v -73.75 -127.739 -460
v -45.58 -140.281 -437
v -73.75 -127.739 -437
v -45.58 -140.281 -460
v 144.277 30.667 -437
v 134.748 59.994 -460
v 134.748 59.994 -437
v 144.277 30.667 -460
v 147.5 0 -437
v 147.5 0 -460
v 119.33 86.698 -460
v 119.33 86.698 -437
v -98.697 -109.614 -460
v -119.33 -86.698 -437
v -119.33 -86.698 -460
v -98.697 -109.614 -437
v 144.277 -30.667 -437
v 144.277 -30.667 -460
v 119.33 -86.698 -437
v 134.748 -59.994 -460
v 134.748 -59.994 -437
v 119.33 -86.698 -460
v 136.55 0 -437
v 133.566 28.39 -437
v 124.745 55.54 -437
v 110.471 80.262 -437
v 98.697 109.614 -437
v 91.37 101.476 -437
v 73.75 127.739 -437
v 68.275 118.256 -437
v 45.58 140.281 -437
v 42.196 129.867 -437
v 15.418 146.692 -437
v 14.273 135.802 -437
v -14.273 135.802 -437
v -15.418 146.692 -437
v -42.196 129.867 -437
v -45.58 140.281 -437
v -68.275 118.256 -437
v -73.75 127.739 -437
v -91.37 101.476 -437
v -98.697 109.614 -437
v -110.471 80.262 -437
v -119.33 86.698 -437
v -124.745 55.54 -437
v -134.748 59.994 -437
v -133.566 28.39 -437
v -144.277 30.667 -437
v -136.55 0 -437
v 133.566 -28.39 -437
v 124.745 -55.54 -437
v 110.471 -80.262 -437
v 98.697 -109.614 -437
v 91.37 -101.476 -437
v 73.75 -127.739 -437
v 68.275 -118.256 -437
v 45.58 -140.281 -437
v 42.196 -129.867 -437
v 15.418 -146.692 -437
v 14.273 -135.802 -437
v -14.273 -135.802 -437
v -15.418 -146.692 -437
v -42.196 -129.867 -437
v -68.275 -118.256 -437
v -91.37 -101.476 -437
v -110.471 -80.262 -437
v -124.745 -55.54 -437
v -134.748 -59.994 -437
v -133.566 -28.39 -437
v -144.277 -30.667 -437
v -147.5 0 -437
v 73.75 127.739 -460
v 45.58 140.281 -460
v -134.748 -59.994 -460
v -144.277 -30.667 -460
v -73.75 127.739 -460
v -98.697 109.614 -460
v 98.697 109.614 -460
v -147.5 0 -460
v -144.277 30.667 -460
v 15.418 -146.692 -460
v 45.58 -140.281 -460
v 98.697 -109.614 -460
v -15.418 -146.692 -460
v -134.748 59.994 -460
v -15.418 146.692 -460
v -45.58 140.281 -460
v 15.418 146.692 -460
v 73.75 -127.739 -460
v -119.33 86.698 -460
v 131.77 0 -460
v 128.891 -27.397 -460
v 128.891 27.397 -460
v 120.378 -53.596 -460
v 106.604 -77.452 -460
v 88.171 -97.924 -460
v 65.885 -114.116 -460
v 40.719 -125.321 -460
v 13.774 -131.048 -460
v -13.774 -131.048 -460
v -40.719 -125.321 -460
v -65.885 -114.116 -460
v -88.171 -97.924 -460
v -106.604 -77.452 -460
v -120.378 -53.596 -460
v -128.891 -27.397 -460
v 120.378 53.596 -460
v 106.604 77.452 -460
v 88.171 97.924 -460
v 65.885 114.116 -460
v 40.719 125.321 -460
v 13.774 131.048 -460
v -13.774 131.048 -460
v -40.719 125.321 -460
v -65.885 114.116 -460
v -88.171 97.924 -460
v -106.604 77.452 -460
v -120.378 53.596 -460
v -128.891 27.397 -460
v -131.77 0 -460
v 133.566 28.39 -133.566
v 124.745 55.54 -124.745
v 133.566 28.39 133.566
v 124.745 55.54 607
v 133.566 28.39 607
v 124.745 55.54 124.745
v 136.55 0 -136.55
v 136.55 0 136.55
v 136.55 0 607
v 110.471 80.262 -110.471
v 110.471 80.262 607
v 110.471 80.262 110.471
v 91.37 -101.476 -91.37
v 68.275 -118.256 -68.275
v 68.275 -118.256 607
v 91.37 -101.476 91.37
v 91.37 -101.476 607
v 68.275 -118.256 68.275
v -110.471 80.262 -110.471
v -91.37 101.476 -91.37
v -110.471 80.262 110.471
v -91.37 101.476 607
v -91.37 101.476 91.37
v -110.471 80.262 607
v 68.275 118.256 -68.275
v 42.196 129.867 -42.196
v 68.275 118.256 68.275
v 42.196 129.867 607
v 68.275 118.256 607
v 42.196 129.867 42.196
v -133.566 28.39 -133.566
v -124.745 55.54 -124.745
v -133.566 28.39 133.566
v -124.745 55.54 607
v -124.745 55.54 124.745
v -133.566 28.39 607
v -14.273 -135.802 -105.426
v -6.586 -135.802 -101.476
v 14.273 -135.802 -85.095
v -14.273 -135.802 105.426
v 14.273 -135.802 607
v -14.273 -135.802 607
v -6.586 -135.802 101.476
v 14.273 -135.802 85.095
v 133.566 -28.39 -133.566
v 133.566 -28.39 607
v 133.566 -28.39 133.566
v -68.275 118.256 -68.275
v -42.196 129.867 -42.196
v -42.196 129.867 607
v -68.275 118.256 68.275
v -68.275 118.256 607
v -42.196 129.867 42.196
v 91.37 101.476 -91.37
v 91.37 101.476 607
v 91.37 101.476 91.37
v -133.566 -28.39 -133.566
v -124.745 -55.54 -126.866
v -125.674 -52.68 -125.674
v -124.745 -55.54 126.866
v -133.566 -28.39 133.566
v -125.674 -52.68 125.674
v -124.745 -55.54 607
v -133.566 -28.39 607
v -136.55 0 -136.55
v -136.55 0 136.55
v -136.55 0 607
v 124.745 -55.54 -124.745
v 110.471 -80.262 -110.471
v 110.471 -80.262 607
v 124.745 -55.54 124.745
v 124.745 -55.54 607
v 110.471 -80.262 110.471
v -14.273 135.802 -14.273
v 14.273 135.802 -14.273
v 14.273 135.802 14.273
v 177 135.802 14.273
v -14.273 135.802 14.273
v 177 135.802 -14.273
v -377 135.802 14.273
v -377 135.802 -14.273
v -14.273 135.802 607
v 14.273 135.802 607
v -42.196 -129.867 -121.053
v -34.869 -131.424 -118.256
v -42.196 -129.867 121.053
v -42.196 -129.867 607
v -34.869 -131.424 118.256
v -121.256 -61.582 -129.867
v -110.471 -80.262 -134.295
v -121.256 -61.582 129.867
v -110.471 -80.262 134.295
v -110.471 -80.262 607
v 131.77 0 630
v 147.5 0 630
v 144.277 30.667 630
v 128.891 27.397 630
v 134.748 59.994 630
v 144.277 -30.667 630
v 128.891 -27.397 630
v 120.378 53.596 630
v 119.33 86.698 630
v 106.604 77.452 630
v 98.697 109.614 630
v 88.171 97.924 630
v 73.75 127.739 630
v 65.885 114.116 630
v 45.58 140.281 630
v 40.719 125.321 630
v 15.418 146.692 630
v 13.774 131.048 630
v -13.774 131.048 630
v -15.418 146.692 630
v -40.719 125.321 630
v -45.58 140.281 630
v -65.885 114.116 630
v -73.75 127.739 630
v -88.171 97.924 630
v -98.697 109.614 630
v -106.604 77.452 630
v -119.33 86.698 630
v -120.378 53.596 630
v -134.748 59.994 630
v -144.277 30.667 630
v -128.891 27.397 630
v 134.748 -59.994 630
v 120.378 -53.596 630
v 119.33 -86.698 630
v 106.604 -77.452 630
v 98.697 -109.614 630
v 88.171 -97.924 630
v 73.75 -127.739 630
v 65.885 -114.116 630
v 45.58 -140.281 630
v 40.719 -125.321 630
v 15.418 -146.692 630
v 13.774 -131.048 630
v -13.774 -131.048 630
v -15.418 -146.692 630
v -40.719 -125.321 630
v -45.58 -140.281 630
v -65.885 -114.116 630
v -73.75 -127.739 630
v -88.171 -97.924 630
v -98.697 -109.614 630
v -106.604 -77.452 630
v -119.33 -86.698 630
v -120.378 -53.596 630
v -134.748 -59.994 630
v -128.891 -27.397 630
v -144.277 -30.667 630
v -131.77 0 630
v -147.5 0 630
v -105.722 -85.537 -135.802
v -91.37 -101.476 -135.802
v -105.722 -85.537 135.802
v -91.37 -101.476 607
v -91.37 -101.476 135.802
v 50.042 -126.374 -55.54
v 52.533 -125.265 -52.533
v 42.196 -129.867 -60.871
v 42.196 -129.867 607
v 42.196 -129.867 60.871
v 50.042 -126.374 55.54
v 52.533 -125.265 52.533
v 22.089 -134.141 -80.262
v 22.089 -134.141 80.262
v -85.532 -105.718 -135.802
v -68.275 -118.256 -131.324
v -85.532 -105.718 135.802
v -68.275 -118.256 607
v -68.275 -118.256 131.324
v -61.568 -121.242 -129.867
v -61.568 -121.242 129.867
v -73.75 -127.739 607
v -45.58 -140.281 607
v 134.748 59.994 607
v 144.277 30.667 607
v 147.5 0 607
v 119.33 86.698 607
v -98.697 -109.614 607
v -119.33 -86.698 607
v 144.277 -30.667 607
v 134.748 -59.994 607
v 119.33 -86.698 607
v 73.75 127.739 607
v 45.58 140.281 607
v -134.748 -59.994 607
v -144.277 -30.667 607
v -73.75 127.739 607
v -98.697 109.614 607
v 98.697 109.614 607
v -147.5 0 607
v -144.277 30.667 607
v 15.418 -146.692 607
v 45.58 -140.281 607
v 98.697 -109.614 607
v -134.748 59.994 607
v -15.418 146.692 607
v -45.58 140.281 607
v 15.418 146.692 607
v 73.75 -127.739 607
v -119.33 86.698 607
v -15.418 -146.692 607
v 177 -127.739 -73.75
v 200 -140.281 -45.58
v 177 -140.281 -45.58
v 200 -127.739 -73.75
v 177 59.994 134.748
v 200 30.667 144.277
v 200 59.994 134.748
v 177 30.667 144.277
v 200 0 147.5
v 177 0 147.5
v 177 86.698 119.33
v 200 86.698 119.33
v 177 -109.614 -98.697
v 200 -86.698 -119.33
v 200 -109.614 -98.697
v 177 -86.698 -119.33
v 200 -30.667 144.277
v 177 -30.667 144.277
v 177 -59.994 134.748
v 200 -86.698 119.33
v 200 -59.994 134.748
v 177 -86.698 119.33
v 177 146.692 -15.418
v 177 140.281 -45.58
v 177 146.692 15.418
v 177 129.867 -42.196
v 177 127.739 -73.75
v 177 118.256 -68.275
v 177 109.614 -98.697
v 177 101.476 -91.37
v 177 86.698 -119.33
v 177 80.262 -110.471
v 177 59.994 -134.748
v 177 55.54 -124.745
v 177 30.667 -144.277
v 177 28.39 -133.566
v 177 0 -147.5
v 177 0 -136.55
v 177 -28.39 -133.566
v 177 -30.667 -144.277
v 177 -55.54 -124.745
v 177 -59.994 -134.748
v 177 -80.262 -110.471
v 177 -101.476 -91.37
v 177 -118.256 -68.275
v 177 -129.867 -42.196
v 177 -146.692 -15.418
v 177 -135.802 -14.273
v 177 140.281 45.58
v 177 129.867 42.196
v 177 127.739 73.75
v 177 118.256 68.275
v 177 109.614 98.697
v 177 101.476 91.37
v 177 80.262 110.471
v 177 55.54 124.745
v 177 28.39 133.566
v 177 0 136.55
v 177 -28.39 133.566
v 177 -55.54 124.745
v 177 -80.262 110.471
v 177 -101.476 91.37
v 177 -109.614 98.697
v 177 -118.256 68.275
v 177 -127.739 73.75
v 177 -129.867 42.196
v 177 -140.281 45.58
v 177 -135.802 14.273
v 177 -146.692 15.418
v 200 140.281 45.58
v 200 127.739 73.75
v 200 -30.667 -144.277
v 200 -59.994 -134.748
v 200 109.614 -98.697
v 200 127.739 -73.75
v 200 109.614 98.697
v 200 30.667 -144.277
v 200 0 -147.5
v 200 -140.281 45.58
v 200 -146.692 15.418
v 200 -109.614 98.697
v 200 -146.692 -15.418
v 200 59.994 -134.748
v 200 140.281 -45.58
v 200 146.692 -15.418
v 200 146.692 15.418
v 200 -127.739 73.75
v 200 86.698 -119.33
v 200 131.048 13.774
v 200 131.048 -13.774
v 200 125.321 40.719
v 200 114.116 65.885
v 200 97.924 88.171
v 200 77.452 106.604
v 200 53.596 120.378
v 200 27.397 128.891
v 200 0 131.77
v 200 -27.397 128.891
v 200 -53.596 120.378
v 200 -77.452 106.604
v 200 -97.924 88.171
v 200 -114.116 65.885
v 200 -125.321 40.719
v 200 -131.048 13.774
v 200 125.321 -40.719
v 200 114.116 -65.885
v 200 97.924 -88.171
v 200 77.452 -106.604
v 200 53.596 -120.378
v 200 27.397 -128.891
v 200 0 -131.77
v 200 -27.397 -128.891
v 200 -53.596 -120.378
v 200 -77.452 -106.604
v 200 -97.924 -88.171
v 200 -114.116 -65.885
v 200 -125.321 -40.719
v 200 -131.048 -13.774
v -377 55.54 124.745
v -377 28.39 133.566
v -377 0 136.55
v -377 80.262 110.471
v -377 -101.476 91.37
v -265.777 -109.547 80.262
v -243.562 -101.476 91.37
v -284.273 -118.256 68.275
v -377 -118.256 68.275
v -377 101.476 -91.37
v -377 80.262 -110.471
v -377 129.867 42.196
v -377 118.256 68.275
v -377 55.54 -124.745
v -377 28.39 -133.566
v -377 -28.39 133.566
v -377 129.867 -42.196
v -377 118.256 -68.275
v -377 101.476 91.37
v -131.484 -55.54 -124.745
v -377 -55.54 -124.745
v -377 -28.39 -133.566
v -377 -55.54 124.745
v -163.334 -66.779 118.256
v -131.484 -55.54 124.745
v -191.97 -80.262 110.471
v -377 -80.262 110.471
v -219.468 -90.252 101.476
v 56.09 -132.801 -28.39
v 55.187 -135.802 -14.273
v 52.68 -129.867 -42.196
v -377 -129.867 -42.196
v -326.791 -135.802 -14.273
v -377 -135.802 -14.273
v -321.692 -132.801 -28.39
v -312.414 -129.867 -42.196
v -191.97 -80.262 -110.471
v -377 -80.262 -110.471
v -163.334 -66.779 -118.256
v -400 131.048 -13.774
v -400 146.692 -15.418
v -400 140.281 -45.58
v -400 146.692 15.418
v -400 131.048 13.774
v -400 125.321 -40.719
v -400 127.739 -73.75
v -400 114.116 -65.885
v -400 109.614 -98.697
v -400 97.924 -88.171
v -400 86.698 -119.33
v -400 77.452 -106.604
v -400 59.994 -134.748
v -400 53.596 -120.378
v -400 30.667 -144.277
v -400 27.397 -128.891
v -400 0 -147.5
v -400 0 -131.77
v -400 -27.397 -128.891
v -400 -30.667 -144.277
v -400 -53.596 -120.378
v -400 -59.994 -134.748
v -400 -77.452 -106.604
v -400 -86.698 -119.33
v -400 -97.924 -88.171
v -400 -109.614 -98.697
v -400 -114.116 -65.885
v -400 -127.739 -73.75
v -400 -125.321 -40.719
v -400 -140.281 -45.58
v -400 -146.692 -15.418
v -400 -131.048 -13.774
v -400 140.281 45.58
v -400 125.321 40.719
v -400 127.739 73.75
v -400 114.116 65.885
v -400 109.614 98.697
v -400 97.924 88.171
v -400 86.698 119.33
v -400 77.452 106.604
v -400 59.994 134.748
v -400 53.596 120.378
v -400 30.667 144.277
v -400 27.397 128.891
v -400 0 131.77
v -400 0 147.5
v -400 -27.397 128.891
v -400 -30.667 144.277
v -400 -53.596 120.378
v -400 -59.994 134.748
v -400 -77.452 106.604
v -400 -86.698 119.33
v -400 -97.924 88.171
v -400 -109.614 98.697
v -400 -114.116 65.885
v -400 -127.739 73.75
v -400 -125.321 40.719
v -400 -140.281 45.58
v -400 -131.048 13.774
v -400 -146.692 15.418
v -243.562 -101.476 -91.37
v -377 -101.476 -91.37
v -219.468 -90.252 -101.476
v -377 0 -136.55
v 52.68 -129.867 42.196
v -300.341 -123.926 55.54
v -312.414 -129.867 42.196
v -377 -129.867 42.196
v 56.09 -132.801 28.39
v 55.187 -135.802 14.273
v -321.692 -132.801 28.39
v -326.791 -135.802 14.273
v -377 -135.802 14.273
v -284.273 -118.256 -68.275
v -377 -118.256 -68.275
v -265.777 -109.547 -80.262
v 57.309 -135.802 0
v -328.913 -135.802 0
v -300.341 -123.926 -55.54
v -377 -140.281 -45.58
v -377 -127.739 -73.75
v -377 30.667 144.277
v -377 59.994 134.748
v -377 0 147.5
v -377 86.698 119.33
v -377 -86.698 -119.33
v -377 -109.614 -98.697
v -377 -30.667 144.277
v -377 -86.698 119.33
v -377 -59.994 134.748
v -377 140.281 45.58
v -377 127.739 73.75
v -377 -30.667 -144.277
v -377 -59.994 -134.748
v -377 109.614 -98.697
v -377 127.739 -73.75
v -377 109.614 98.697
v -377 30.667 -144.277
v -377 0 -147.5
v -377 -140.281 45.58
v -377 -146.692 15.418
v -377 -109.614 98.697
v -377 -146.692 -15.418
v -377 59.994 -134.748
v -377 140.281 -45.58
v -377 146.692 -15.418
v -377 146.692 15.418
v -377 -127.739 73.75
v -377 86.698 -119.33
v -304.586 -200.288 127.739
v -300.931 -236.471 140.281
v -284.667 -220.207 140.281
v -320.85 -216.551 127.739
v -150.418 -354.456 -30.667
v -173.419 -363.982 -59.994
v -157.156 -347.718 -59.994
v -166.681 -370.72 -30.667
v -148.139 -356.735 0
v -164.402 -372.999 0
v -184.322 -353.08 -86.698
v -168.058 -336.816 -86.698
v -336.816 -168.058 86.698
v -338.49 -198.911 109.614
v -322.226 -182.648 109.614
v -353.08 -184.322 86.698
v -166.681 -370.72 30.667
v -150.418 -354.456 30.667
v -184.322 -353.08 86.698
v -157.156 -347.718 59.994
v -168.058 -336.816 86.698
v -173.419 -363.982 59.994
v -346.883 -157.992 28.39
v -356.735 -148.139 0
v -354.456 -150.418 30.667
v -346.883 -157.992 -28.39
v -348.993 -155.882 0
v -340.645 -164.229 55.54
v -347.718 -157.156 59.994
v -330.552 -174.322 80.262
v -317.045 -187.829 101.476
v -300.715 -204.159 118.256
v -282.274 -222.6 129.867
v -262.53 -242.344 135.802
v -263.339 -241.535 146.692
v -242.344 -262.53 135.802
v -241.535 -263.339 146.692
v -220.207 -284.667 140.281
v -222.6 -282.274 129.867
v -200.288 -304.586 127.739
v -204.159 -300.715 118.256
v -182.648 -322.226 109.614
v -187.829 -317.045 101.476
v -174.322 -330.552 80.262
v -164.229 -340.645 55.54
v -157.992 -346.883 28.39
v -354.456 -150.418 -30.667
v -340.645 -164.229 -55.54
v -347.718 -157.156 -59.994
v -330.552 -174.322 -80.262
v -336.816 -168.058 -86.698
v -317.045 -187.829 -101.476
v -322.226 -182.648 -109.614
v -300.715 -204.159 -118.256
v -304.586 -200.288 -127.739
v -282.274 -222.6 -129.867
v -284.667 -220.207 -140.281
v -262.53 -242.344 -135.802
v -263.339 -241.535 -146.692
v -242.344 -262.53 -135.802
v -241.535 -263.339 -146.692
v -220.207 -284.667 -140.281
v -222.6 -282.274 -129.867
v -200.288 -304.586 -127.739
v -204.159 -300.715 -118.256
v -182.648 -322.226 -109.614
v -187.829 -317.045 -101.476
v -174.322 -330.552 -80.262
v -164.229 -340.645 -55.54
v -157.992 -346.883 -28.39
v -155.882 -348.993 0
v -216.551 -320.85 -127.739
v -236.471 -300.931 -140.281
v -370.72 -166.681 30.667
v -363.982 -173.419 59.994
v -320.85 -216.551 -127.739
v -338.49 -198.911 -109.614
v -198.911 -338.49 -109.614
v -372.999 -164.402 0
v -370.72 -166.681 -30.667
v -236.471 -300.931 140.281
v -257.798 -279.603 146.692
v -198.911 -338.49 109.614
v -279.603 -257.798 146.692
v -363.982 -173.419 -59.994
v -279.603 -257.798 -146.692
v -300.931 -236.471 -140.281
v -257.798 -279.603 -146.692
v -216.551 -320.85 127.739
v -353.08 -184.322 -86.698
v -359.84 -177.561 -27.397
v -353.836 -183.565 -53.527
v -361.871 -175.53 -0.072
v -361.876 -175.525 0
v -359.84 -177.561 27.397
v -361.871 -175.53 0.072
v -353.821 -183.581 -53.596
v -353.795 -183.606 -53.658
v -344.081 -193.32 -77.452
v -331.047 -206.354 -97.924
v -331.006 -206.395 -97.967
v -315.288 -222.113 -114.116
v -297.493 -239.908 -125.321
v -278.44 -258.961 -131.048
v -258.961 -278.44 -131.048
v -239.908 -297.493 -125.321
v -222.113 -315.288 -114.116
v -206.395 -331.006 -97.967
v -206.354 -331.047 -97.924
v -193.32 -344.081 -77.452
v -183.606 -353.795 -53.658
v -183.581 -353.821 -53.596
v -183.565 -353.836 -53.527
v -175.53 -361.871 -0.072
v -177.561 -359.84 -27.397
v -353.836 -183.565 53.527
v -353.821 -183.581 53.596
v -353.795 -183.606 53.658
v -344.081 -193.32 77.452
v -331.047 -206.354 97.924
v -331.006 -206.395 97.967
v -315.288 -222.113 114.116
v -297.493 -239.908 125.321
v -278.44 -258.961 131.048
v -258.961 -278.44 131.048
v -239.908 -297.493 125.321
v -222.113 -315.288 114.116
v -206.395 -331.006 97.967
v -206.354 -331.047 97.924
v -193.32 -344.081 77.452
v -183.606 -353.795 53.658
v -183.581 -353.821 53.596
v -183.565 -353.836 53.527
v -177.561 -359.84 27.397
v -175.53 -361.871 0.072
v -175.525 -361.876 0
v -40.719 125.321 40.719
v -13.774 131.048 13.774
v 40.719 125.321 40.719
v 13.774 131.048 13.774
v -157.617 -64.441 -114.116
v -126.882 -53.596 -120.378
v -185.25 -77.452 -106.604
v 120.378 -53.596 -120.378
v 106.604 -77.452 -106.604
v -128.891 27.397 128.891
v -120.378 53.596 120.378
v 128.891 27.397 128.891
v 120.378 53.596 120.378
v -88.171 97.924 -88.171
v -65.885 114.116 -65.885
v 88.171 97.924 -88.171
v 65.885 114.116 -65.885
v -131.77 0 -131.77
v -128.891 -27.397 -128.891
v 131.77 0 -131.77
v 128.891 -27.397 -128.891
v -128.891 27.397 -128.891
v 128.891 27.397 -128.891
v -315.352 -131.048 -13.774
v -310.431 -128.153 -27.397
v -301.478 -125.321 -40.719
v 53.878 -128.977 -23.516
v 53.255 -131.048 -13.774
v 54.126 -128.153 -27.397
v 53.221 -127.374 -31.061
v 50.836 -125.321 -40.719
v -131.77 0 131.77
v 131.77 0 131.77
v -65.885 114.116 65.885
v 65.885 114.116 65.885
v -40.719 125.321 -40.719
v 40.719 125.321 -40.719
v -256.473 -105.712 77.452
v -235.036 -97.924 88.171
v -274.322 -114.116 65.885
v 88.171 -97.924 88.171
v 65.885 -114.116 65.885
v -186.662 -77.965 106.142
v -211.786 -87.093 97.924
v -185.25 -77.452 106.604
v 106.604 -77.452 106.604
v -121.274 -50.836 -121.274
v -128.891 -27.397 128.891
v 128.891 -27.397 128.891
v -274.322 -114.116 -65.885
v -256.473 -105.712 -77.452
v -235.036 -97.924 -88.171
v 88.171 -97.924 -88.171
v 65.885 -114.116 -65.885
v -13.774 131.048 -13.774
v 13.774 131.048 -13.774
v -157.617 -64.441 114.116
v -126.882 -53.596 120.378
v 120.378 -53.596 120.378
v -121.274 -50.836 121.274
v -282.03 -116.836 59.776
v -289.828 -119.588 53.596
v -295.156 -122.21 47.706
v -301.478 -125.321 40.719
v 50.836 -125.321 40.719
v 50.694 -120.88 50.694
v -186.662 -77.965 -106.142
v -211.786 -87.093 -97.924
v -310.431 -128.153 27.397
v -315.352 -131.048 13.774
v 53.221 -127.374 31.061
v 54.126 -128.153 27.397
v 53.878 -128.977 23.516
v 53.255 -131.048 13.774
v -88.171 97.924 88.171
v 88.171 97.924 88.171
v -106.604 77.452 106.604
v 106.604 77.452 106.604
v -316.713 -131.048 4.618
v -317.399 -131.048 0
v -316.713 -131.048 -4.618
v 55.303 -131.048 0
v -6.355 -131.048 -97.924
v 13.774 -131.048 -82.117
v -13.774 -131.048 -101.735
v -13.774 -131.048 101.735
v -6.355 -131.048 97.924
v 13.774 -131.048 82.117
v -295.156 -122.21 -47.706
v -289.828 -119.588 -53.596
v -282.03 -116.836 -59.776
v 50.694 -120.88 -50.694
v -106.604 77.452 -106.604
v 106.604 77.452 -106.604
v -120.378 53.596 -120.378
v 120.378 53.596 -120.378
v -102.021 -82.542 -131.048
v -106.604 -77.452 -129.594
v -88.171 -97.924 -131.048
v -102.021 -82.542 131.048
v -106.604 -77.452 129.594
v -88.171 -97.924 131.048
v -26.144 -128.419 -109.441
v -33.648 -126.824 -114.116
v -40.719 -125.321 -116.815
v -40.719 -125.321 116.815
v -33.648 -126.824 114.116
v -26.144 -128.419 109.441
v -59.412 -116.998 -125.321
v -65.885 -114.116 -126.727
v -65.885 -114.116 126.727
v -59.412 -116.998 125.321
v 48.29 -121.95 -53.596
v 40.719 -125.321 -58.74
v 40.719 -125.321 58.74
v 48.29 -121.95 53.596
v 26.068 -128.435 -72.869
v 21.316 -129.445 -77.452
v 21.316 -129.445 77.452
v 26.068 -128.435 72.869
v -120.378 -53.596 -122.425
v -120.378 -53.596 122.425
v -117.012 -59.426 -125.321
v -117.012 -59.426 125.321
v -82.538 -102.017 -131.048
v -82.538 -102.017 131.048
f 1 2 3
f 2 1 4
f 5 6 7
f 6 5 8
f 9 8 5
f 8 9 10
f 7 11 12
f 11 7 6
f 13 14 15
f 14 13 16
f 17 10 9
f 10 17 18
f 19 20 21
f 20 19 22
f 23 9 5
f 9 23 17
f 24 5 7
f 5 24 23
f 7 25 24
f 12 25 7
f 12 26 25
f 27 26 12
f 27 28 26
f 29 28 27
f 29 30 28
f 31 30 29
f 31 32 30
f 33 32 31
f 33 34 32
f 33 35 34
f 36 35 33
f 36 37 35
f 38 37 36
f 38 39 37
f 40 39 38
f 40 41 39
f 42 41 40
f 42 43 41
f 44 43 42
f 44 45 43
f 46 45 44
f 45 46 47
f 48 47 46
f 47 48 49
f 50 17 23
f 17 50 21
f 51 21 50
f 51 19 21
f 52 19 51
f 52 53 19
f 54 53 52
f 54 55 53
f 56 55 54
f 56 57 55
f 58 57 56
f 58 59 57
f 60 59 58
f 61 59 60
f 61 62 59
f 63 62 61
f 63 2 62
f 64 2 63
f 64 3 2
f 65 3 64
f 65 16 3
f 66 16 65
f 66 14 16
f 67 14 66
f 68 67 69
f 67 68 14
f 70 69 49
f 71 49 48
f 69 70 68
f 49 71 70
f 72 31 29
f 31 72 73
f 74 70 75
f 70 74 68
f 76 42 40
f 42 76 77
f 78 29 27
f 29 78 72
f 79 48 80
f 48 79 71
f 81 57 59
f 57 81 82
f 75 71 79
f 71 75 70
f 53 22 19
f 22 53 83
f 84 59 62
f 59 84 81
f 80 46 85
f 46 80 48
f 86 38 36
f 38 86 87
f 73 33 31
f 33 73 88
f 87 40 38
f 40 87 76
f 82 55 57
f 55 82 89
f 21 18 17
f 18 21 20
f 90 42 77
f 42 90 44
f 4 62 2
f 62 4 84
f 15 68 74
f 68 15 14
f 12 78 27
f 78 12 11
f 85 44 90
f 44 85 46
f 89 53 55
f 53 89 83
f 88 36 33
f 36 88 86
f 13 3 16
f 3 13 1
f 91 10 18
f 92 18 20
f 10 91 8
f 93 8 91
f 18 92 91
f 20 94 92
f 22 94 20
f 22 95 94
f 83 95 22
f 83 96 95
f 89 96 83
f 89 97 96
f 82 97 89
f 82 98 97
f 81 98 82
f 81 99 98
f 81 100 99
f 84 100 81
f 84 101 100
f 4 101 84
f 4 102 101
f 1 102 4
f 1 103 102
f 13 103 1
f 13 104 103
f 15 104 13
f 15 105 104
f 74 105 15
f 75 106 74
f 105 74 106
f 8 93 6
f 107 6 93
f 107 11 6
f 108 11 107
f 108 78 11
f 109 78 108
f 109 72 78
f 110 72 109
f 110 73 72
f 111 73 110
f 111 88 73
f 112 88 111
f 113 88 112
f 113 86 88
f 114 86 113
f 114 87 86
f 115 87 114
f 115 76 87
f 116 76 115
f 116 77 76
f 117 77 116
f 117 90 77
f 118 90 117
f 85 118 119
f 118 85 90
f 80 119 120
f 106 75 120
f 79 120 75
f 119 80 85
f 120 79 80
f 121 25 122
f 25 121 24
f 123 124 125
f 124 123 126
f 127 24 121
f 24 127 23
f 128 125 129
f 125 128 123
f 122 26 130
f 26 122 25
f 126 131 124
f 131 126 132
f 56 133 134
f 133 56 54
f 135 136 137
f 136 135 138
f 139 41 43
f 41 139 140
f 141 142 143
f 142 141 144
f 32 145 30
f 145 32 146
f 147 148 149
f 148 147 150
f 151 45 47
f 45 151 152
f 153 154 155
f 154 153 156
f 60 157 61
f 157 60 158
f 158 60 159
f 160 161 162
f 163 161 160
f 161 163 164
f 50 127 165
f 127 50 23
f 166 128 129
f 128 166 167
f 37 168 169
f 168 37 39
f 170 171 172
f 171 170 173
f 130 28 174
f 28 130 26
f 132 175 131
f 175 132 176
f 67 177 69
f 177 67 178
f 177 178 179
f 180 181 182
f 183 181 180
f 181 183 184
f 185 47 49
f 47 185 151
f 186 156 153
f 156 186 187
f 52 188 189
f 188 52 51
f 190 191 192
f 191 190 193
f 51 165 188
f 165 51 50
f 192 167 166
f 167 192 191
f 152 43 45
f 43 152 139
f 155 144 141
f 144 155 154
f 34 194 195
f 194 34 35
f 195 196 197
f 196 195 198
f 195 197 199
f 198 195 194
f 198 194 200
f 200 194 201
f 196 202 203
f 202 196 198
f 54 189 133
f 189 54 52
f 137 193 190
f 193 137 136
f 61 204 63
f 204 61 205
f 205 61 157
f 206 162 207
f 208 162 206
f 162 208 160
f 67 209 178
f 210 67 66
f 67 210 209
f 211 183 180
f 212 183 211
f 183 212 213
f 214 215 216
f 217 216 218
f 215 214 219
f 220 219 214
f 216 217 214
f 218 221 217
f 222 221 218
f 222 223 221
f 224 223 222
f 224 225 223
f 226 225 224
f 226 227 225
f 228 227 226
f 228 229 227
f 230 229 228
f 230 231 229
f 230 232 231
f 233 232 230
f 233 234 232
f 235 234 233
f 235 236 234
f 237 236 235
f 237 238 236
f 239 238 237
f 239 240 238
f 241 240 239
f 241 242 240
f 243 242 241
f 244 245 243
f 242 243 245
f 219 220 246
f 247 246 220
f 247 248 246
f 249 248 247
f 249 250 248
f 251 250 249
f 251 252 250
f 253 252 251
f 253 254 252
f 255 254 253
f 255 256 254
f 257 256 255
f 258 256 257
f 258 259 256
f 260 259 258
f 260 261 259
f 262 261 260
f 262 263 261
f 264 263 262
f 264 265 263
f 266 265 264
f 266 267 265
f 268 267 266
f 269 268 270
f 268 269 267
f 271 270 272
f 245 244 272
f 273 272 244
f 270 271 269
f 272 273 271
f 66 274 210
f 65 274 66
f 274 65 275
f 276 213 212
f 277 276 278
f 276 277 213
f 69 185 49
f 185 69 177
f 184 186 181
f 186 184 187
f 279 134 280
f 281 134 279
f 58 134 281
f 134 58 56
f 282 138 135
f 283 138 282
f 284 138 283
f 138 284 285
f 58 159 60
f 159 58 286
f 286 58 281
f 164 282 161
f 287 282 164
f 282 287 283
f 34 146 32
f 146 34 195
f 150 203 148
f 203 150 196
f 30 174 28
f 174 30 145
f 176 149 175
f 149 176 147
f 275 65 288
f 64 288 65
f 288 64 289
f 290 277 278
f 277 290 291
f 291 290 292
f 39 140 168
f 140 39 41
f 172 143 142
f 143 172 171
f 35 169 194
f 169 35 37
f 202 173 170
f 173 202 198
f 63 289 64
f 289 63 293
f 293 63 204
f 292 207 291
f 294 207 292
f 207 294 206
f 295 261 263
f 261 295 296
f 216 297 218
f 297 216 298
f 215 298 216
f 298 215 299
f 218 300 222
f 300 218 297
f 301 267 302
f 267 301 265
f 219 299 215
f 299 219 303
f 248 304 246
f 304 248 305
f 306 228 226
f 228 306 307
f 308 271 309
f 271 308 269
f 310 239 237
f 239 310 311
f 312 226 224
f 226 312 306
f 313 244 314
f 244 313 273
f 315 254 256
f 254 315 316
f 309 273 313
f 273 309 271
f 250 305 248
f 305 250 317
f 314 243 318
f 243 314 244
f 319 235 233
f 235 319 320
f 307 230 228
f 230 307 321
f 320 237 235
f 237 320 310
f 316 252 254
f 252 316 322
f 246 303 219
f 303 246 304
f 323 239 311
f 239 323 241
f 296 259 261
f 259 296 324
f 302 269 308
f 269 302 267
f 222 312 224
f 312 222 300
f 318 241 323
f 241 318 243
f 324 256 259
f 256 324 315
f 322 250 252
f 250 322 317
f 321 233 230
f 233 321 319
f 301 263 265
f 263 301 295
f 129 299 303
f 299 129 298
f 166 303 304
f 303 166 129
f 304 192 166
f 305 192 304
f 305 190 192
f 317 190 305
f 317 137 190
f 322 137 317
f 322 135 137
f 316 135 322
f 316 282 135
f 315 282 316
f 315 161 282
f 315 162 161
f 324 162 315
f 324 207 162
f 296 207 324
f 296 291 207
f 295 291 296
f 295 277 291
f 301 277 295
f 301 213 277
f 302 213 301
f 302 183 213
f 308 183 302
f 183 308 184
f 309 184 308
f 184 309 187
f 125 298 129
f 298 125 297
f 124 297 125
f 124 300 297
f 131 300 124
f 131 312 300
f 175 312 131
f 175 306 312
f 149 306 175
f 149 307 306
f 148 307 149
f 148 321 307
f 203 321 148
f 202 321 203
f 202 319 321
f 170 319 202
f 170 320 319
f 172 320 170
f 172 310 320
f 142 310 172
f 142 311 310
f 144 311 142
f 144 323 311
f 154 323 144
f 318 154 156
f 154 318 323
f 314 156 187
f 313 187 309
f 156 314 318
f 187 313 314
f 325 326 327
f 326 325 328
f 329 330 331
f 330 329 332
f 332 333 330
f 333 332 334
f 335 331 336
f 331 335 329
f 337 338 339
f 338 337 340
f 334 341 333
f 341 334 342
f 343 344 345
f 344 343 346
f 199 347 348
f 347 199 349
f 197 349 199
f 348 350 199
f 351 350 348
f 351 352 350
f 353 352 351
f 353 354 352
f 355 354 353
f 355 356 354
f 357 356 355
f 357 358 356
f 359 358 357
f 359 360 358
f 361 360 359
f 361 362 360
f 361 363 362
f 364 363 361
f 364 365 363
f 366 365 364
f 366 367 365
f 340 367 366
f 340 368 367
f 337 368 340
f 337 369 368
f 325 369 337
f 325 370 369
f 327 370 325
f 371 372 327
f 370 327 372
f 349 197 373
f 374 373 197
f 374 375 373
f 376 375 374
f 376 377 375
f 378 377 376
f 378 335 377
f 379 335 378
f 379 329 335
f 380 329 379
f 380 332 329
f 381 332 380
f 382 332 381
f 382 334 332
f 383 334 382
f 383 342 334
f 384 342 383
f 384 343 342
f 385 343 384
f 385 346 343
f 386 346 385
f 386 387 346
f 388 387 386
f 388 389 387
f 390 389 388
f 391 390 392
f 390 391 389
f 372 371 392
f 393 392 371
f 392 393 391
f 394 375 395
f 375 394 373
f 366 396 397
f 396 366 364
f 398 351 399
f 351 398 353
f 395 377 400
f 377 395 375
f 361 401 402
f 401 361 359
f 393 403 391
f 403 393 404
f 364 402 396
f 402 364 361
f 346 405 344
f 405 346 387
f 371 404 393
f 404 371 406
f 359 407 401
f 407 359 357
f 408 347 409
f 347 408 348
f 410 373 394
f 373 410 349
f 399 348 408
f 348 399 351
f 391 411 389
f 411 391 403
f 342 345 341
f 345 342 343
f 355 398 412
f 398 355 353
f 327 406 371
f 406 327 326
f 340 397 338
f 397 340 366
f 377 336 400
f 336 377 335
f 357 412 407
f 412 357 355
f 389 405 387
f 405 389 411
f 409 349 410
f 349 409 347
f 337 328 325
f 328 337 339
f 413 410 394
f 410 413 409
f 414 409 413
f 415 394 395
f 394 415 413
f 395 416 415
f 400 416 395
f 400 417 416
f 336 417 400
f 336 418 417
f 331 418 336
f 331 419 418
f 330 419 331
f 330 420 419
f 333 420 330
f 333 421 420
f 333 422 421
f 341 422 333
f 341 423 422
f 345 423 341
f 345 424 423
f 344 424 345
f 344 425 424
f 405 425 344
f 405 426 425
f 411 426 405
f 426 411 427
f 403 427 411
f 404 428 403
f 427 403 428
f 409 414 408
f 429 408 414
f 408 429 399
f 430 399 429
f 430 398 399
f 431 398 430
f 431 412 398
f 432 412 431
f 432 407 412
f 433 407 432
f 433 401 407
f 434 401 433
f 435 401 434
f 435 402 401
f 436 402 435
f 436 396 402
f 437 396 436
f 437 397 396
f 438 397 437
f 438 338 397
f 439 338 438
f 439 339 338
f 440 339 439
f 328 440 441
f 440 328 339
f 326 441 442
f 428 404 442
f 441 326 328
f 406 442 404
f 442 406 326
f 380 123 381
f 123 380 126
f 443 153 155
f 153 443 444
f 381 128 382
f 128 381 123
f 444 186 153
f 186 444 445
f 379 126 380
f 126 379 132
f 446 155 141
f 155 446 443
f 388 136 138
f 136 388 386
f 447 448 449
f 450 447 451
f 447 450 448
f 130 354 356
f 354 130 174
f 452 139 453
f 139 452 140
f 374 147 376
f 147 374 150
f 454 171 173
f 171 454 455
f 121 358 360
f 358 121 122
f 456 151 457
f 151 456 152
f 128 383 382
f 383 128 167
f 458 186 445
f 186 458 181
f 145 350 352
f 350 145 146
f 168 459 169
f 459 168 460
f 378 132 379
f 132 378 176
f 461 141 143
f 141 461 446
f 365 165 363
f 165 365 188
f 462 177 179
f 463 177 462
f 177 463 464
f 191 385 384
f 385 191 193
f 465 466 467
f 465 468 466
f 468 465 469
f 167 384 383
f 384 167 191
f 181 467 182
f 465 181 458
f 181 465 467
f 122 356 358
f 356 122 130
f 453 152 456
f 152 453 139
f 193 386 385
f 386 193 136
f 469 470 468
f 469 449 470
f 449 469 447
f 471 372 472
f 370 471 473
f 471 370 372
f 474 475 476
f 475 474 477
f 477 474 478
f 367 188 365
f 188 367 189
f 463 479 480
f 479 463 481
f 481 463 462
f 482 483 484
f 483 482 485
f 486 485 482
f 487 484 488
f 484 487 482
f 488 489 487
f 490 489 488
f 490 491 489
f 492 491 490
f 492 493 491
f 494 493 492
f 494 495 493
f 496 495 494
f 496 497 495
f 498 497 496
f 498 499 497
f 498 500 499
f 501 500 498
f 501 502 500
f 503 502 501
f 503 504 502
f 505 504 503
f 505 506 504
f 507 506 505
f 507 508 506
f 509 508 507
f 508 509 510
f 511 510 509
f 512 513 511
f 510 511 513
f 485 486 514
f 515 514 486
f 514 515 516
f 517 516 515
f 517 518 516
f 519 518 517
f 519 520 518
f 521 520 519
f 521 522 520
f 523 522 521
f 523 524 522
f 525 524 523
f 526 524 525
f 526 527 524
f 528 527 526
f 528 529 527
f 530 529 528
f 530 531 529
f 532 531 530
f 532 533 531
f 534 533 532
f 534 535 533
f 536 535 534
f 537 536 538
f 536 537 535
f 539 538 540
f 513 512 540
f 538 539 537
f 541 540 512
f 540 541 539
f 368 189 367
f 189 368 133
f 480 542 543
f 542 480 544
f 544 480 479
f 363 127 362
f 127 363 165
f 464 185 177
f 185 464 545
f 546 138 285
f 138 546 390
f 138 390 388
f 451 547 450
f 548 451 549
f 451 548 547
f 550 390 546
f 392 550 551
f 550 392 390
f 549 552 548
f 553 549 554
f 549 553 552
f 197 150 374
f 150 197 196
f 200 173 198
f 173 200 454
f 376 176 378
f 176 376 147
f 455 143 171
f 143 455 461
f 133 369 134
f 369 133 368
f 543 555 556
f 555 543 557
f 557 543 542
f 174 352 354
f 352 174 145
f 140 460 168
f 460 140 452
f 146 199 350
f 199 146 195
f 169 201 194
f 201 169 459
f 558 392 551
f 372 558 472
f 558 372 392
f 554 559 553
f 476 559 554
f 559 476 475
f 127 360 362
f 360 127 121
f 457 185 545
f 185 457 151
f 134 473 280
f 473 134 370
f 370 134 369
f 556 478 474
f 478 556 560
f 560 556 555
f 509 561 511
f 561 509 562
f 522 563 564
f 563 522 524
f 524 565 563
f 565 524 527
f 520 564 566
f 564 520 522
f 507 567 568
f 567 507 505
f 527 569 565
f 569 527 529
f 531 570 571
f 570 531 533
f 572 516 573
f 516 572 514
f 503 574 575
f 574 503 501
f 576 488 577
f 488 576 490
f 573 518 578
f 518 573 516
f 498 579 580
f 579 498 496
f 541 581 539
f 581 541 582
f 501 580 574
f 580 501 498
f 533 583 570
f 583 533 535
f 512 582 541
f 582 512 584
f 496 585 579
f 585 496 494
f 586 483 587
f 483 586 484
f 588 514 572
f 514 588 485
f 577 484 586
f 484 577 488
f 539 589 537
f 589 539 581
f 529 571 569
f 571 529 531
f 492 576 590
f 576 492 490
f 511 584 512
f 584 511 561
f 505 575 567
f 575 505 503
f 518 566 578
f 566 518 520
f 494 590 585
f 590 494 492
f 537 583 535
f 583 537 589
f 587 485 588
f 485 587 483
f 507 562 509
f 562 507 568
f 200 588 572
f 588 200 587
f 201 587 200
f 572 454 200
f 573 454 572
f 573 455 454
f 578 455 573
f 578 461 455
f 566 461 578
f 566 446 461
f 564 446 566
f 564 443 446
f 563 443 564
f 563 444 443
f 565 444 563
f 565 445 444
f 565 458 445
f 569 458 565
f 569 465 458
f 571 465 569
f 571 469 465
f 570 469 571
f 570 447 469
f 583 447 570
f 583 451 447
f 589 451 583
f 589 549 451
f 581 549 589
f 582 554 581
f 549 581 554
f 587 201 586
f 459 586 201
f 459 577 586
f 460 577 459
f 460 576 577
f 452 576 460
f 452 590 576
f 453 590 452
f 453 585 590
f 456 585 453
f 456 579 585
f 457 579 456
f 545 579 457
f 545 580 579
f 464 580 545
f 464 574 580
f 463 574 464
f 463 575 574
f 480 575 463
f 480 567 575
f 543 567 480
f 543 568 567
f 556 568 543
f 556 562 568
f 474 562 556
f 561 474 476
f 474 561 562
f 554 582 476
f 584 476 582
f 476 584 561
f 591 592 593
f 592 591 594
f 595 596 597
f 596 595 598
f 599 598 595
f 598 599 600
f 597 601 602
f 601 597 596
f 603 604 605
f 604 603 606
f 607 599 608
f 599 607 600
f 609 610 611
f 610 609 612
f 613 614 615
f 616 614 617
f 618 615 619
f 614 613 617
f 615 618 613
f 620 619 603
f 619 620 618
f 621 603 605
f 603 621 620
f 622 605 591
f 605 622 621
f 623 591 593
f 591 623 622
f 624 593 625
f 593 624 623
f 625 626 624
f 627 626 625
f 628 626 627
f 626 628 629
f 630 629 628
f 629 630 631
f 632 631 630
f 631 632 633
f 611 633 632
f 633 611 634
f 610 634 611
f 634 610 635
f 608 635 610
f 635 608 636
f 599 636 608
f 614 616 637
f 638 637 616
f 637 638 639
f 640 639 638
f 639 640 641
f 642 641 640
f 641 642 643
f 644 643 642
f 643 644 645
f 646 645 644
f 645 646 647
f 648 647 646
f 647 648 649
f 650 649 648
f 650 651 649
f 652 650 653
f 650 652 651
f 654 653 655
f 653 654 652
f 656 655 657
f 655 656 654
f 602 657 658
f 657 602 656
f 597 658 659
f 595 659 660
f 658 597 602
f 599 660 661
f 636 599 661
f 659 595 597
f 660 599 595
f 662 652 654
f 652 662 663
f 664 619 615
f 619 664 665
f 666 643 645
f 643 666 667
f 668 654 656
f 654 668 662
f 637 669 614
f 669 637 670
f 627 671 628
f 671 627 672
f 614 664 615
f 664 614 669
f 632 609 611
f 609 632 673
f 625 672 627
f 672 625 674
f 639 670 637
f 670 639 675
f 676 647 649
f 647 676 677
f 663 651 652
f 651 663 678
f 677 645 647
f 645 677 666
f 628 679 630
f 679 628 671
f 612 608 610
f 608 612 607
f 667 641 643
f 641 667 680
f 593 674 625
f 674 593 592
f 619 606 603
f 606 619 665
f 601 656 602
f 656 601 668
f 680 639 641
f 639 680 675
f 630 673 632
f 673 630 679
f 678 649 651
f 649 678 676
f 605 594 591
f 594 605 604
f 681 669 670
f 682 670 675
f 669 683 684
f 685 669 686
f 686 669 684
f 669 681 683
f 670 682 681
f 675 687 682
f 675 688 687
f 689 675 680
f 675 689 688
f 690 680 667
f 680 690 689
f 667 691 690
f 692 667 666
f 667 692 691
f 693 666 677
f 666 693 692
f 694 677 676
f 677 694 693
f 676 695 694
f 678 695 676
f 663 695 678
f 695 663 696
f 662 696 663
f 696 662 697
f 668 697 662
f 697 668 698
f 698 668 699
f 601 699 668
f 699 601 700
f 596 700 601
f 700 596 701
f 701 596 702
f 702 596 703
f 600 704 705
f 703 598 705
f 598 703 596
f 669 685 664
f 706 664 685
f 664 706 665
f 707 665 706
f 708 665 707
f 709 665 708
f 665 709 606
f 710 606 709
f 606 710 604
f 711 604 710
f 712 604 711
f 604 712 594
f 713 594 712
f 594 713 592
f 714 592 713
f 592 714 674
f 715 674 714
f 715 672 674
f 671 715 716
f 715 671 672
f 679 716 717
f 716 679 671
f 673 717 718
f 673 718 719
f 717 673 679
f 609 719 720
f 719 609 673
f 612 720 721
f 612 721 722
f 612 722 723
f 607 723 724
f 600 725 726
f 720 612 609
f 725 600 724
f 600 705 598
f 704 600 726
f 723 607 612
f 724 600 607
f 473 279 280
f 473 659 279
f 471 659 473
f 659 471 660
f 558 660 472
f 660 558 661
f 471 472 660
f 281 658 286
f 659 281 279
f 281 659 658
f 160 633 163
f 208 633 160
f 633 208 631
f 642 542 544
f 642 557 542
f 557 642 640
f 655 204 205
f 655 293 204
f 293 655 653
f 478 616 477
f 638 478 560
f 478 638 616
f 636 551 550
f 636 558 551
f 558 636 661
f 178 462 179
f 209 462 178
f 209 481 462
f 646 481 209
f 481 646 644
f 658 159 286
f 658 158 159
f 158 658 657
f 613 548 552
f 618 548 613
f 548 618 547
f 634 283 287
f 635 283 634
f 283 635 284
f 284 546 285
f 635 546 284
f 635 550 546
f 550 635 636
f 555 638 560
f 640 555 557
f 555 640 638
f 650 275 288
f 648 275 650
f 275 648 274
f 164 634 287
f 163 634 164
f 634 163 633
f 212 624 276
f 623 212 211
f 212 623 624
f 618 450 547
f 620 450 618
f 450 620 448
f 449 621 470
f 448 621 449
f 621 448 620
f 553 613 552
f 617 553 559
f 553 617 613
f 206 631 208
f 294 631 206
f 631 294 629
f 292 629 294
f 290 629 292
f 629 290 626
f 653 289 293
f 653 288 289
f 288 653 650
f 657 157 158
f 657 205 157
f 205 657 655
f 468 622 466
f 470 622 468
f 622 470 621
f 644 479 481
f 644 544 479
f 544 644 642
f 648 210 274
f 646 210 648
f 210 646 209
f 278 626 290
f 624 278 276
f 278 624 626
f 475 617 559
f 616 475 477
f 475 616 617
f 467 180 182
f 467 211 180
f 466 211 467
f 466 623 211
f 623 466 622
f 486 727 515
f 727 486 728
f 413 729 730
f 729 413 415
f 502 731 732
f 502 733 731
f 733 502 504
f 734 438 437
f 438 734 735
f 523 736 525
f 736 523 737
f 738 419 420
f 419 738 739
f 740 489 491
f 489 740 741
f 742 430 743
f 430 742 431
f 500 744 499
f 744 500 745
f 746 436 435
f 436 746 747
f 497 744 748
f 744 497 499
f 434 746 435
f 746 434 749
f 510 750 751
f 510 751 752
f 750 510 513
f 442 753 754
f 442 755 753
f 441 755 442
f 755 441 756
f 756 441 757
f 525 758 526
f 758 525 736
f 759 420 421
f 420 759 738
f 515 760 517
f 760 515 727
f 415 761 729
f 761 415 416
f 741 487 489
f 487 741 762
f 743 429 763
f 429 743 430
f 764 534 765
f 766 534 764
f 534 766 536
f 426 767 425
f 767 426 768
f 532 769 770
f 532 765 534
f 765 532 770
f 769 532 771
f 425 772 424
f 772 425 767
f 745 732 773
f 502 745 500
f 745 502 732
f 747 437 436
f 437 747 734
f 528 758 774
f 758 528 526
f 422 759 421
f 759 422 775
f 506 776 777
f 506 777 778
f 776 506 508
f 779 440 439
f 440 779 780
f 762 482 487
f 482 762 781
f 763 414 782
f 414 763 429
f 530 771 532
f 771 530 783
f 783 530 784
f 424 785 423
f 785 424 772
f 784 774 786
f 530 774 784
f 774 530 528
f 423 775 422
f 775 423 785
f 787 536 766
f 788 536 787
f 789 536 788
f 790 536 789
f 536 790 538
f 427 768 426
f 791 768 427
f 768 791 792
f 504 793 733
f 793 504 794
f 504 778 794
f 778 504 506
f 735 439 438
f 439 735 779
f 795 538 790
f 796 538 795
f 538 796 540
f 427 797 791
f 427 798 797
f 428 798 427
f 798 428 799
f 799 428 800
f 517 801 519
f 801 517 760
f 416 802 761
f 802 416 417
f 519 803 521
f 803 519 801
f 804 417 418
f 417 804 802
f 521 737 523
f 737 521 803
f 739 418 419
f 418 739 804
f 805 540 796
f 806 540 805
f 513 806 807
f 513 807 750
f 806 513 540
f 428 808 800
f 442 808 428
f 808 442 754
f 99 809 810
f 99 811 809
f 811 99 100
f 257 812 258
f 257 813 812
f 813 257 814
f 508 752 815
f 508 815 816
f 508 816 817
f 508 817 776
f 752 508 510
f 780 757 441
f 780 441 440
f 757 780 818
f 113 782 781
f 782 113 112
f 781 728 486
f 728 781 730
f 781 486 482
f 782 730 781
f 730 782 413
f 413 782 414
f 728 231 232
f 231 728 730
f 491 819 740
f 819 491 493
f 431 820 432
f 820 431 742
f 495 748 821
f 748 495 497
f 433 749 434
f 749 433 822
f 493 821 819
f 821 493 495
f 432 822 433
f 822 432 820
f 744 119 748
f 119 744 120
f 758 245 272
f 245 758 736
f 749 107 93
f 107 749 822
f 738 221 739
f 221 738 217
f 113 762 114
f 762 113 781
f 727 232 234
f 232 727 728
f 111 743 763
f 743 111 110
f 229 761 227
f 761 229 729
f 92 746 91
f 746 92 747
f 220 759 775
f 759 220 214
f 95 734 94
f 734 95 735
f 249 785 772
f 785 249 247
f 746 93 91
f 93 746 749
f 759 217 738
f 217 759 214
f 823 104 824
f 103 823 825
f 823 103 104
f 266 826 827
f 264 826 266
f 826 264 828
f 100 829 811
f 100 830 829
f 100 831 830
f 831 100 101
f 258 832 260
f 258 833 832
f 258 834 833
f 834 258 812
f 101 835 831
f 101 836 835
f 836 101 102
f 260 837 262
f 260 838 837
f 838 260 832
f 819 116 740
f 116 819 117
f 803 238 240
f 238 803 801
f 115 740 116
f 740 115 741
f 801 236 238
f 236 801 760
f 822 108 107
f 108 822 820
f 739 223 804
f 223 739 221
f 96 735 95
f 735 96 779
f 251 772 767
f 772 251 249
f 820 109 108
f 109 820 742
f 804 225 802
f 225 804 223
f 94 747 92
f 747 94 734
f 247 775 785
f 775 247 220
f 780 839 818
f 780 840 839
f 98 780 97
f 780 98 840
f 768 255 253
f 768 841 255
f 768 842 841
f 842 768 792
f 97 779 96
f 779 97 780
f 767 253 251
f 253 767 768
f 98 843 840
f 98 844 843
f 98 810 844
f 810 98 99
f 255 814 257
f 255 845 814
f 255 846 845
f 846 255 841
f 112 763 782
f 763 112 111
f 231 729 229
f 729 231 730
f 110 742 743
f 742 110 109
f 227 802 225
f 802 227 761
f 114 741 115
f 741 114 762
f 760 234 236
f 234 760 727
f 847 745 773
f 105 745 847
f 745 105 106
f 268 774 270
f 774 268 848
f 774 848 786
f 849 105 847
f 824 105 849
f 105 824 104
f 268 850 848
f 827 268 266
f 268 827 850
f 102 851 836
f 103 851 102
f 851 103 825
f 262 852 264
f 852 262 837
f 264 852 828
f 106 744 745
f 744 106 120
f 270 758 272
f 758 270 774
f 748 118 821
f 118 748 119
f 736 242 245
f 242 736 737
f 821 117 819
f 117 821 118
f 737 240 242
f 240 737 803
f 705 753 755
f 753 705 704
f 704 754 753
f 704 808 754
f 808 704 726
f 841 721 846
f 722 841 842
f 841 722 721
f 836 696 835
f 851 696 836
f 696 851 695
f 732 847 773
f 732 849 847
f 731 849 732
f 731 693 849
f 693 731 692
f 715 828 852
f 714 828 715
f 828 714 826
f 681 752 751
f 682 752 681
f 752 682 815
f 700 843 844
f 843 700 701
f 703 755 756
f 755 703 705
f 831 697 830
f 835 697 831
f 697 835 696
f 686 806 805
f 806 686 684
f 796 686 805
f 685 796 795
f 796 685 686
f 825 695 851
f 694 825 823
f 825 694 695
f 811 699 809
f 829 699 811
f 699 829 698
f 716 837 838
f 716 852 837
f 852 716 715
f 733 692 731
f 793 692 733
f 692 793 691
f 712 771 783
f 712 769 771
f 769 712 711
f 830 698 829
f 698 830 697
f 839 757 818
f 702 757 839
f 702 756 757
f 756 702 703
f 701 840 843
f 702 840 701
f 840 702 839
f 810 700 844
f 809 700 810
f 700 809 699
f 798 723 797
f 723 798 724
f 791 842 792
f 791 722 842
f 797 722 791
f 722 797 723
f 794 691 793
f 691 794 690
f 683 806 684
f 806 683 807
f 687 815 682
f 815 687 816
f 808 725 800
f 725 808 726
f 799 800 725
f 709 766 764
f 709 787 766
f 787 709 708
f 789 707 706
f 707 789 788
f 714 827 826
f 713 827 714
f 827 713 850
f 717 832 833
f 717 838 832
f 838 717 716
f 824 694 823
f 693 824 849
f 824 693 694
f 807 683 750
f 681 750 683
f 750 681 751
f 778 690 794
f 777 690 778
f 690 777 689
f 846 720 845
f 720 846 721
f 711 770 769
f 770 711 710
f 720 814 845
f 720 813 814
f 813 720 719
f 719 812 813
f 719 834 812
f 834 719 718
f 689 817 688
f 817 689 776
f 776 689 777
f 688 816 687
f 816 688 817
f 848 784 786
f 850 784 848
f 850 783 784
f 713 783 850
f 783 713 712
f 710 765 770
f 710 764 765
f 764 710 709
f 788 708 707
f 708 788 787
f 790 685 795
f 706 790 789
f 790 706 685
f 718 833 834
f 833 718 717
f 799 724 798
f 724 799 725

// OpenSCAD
// file: chamber_mockup.scad
flangeD=295;
flangeT=23;

pipeOuterD=273.1;
pipeWallT=4.78;

subtractFudge = 2;

module drawChamber ( botPipeL=460, topPipeL=630, upstreamPipeL=400, downstreamPipeL=200, viewPipeL=380, viewPortZAngle=-135 ) {
    difference(){
        union(){
            //vert Pipe
            translate([0,0,-botPipeL]) union(){
                cylinder(h=flangeT, d=flangeD); //bot flange
                cylinder(h=botPipeL+topPipeL, d=pipeOuterD); //vert pipe
                translate([0,0,botPipeL+topPipeL-flangeT]) cylinder(h=flangeT, d=flangeD); //top flange
            }
            //horz pipe
            rotate([0,-90,0]) translate([0,0,-downstreamPipeL]) union(){
                cylinder(h=flangeT, d=flangeD); //downstream flange
                cylinder(h=downstreamPipeL+upstreamPipeL, d=pipeOuterD); //horz pipe
                translate([0,0,downstreamPipeL+upstreamPipeL-flangeT]) cylinder(h=flangeT, d=flangeD); //upstream flange
            }
            //view pipe
            rotate([-90,0,viewPortZAngle+90]) translate([0,0,-viewPipeL]) union(){
                cylinder(h=flangeT, d=flangeD); //view flange
                cylinder(h=viewPipeL, d=pipeOuterD); //vert pipe
            }
        }
        rotate([0,-90,0]) translate([0,0,-downstreamPipeL-subtractFudge/2]) cylinder(h=downstreamPipeL+upstreamPipeL+subtractFudge, d=pipeOuterD-2*pipeWallT); // inner horz pipe
        translate([0,0,-botPipeL-subtractFudge/2]) cylinder(h=botPipeL+topPipeL+subtractFudge, d=pipeOuterD-2*pipeWallT); //inner vert pipe
        rotate([-90,0,viewPortZAngle+90]) translate([0,0,-viewPipeL-subtractFudge/2]) cylinder(h=viewPipeL+subtractFudge, d=pipeOuterD-2*pipeWallT); //inner view pipe
    }
}
// main file
include <chamber_mockup.scad>

// downstream chamber
drawChamber();

//translate ([-600,0,0]) translate ([400,0,0]) drawChamber(); 

//translate ([-1500,0,0]) drawChamber(); 

//translate ([-600,0,0]) drawChamber(); 

// upstream chamber
//translate ([-400,0,0]) drawChamber(upstreamPipeL=200, downstreamPipeL=400, viewPortZAngle=-45); // downstream chamber
